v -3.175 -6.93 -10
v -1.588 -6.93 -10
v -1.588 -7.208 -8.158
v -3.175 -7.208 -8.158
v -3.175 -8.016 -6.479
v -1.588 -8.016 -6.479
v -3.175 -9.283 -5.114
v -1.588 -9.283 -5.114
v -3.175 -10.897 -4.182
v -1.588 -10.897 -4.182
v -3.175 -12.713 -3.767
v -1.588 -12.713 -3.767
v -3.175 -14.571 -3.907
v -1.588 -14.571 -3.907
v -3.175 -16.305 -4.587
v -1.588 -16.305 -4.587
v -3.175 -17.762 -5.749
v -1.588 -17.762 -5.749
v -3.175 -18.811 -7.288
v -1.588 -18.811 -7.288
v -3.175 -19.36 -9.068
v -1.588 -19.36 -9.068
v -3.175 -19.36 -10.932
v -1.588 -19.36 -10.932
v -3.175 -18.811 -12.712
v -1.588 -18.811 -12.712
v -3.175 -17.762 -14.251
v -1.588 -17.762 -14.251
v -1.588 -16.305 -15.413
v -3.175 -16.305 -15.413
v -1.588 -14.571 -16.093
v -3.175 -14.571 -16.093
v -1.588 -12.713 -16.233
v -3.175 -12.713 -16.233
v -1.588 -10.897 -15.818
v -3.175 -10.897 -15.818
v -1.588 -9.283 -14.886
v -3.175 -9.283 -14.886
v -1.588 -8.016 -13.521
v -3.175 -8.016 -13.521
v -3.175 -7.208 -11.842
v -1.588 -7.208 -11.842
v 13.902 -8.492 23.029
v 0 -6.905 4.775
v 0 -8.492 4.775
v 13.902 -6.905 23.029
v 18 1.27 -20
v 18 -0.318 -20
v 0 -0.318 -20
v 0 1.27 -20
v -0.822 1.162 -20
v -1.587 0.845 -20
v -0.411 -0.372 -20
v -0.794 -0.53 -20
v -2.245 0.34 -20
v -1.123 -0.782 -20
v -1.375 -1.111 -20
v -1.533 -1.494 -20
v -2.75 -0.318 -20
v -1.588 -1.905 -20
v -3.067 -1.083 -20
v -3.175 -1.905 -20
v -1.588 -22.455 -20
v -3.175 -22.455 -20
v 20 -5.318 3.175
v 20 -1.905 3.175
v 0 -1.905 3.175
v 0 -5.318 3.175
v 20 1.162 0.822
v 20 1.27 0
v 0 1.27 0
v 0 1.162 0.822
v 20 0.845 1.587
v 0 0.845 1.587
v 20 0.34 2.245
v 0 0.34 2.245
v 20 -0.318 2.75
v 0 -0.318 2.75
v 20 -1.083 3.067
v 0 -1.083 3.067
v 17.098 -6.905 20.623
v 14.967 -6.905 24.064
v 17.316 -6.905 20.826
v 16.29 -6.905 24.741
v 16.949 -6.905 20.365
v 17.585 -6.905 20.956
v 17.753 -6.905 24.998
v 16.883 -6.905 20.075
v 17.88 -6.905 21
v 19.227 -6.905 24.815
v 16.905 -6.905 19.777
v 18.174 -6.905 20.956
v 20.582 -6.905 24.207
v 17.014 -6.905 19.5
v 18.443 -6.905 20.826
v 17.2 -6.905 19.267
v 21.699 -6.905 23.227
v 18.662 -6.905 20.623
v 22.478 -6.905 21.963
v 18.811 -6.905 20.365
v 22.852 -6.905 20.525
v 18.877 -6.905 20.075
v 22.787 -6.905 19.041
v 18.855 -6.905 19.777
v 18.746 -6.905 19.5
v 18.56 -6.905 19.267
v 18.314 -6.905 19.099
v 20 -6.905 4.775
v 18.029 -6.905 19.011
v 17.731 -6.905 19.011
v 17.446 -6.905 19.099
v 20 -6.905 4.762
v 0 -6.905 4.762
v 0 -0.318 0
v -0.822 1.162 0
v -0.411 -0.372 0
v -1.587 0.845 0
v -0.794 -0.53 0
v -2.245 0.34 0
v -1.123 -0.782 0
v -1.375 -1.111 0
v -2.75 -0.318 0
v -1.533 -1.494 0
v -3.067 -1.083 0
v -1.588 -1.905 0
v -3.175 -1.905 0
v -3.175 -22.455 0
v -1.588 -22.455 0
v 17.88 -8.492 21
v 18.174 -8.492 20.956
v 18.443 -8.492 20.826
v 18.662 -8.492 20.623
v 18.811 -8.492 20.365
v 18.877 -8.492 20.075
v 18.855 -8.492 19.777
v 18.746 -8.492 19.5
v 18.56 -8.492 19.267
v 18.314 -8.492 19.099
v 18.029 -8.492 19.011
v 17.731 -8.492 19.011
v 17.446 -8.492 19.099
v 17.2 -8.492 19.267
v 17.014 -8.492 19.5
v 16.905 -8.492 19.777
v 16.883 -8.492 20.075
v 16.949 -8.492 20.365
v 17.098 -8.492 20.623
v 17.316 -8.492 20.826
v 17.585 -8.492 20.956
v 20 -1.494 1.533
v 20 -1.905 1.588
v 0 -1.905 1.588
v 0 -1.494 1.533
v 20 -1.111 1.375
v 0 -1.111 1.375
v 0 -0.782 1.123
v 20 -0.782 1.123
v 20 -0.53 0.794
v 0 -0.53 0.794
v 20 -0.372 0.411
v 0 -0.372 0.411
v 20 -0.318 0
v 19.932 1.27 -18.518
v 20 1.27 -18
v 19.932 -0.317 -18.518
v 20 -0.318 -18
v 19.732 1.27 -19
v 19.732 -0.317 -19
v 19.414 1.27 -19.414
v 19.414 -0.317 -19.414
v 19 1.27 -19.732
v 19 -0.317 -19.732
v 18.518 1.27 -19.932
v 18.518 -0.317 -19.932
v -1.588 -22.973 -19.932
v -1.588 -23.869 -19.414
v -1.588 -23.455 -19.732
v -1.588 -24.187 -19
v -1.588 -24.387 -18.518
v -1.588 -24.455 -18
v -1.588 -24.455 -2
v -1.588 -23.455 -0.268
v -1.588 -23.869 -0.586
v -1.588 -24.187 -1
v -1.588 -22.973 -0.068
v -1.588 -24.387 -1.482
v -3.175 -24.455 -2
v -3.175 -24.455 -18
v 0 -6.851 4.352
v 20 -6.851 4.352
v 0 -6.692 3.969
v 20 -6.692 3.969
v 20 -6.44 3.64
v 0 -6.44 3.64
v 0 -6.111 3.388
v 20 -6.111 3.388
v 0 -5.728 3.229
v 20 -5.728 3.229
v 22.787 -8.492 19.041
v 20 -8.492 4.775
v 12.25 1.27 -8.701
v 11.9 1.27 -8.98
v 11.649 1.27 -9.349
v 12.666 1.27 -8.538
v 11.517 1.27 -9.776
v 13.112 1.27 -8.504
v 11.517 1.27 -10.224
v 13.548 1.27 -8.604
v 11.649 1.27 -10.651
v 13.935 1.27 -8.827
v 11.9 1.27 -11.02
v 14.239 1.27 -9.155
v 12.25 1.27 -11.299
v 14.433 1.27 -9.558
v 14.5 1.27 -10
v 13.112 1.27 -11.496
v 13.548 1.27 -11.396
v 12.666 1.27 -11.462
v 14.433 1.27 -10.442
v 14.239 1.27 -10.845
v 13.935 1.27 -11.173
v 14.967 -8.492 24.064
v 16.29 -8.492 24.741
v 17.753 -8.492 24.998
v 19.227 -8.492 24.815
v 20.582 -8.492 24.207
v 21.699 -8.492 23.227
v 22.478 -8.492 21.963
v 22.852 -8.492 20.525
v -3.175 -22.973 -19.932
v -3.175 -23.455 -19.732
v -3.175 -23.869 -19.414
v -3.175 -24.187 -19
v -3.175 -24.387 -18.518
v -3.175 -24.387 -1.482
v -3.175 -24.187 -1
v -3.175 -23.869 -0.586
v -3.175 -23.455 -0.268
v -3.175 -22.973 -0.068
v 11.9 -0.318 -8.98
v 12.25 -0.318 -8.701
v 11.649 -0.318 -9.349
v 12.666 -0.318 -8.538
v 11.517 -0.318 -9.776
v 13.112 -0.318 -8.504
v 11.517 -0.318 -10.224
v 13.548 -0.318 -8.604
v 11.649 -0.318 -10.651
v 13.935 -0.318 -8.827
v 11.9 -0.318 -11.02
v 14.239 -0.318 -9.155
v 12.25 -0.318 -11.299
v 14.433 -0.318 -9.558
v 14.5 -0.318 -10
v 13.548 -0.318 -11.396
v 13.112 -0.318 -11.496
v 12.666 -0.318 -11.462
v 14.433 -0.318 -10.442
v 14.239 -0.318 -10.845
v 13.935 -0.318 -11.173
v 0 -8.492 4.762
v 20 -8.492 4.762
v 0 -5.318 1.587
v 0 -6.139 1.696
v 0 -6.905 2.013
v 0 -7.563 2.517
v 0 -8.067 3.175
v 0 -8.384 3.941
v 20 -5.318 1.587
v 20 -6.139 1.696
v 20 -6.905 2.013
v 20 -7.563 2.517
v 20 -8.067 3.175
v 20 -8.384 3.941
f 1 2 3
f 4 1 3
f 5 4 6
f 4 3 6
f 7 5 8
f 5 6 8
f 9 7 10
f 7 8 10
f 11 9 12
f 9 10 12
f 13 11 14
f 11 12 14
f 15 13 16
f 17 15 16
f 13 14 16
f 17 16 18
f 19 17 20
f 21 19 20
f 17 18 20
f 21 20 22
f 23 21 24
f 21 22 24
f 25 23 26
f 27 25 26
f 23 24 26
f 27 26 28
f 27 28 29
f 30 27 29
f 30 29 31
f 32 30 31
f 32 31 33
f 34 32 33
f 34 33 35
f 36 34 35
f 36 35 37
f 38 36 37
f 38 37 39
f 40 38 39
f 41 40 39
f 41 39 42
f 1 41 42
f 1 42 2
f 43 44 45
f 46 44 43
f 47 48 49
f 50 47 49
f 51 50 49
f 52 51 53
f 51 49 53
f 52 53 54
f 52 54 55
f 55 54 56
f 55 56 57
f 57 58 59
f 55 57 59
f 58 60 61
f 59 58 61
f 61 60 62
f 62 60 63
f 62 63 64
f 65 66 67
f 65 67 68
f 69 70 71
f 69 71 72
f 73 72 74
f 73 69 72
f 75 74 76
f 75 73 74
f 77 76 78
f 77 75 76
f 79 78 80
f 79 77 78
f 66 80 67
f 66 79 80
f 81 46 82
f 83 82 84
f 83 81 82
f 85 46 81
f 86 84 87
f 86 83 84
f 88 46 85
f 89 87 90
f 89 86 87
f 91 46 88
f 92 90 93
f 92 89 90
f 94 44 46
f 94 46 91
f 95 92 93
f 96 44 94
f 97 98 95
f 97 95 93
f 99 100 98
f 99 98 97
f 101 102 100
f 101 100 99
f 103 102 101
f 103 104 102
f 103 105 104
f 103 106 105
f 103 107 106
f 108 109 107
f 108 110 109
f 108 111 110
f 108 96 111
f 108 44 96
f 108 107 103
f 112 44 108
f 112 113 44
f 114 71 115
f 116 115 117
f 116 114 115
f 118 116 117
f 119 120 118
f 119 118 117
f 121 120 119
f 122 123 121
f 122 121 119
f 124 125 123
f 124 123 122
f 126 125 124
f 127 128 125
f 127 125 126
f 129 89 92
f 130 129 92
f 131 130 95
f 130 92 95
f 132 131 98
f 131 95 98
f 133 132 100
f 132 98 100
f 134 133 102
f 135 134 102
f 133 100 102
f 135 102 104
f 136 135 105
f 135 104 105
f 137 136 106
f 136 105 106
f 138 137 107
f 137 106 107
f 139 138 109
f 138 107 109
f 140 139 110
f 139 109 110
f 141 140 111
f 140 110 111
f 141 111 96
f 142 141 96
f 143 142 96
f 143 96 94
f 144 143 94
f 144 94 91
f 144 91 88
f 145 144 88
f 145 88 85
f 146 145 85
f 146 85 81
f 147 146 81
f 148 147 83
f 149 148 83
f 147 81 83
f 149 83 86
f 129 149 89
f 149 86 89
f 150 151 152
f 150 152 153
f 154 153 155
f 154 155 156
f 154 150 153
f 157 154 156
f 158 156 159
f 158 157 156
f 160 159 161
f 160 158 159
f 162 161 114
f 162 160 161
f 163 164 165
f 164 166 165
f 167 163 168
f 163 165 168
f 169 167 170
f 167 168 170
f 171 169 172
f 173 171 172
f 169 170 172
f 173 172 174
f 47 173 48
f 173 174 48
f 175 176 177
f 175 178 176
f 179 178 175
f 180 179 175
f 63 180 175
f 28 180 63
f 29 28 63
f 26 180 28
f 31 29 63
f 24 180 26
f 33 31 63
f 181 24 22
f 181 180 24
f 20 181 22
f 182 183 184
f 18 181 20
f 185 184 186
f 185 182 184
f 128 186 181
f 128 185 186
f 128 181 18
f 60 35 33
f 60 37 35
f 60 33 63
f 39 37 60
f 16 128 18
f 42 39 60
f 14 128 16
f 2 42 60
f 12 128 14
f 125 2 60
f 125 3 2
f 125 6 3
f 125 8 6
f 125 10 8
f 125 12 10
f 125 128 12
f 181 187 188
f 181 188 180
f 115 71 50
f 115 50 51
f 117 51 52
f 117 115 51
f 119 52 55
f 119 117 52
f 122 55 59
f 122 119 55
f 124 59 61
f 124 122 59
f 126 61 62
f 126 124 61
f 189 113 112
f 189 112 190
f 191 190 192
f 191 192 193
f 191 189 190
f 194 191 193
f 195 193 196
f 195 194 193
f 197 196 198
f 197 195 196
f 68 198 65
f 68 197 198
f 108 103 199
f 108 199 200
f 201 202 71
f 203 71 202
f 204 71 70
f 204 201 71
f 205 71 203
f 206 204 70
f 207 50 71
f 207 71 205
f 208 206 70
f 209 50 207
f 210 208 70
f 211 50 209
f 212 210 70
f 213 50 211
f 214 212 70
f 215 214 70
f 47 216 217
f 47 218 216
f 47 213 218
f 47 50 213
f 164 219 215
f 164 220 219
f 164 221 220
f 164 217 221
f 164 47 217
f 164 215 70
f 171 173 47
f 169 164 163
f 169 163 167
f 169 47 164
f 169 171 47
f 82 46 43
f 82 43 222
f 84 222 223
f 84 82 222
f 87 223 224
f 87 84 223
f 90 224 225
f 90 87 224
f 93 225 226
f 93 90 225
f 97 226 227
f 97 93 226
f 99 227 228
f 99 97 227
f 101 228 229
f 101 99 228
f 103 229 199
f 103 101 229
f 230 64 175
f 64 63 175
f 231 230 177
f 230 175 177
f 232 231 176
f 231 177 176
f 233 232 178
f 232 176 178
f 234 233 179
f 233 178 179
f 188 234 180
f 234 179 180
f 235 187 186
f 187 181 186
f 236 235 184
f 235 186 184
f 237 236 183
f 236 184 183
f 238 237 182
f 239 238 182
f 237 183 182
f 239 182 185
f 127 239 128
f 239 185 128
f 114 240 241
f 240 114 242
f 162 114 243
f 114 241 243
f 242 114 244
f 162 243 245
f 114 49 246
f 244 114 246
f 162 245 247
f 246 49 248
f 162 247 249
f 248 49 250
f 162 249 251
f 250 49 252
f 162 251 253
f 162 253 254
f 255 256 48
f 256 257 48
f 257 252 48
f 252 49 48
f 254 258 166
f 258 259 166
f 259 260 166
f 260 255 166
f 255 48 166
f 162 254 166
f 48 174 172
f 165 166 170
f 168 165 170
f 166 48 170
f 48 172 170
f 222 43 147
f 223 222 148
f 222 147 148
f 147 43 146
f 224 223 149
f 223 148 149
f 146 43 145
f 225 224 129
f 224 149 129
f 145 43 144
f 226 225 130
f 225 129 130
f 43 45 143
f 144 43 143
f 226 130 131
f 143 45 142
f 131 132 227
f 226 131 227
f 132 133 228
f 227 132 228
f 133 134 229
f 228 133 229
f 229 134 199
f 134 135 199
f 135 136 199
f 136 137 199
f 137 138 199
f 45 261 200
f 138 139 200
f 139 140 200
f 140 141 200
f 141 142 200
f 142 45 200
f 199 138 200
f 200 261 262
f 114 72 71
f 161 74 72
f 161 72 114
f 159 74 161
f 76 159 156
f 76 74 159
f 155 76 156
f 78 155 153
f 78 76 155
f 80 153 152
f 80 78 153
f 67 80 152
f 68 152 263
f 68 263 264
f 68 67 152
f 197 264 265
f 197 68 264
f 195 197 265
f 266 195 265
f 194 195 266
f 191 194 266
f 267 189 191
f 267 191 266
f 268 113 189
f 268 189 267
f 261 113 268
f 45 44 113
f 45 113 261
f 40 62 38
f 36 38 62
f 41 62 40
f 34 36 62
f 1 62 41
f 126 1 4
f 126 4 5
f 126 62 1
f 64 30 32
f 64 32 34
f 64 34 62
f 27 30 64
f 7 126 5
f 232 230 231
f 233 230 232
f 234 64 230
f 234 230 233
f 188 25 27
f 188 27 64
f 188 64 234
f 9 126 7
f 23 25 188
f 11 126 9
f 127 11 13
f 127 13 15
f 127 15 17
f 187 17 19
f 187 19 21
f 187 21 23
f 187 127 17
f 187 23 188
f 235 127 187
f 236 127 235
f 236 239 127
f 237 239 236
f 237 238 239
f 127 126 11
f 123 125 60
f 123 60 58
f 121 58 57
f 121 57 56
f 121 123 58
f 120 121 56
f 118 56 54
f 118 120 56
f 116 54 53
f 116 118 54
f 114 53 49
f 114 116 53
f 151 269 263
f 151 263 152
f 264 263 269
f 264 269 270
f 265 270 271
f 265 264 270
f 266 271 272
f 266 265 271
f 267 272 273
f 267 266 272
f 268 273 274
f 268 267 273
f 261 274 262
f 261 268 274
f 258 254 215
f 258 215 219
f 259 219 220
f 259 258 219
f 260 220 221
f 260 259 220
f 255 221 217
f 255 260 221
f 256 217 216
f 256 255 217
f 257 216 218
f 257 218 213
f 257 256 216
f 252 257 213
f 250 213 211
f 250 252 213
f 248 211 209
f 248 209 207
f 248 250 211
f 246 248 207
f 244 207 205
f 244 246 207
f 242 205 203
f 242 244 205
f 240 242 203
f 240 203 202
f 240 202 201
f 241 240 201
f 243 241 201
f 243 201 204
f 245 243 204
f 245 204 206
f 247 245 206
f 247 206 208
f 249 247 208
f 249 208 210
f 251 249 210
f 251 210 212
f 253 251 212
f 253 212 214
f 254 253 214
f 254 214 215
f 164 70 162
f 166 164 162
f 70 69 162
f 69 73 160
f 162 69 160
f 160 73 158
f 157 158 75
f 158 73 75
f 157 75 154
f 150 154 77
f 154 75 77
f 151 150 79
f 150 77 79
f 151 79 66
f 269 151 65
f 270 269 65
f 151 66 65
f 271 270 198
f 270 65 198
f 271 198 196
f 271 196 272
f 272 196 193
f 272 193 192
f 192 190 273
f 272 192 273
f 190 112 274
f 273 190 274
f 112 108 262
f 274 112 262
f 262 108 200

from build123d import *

# Parameters (mm, degrees)
SKETCH2_W                = 20
SKETCH2_H                = 20
BOSS_EXTRUDE1_DEPTH      = 1.27
HOLE1_OUTLINE_R          = 1.5
HOLE1_DEPTH              = 1.27
CONVERT_SOLID3_START     = -0.3175
CONVERT_SOLID3_OUTLINE_W = 20
CONVERT_SOLID3_OUTLINE_H = 20
CONVERT_SOLID3_OUTLINE_R = 1.5
CONVERT_SOLID3_DEPTH     = 0.3175
EDGE_FLANGE1_DEPTH       = 20
CUT_EXTRUDE1_REACH       = 40.263
SKETCH25_R               = 6.25
EDGE_FLANGE3_DEPTH       = 20
EDGE_FLANGE4_DEPTH       = 20
SKETCH31_R               = 1
BOSS_EXTRUDE2_DEPTH      = 1.5875
FILLET1_R                = 2


# Read off the part's stored shape, not the designer's step: Hole1, Convert-Solid3
# Sheet-metal steps are written as plain solids
with BuildPart() as part:
    # Sketch2 → Boss-Extrude1 (new body)
    with BuildSketch(Plane(origin=(0, 0, 0), x_dir=(1, 0, 0), z_dir=(0, 1, 0))):
        with Locations((10, 10)):
            Rectangle(SKETCH2_W, SKETCH2_H)
    extrude(amount=BOSS_EXTRUDE1_DEPTH)

    # Hole1 outline → Hole1 (cut)
    with BuildSketch(Plane(origin=(0, 0, 0), x_dir=(1, 0, 0), z_dir=(0, 1, 0))):
        with Locations((13, 10)):
            Circle(HOLE1_OUTLINE_R)
    extrude(amount=HOLE1_DEPTH, mode=Mode.SUBTRACT)

    # Convert-Solid3 outline → Convert-Solid3 (add)
    with BuildSketch(Plane(origin=(0, 0, 0), x_dir=(1, 0, 0), z_dir=(0, 1, 0)).offset(CONVERT_SOLID3_START)):
        with Locations((10, 10)):
            Rectangle(CONVERT_SOLID3_OUTLINE_W, CONVERT_SOLID3_OUTLINE_H)
        with Locations((13, 10)):
            Circle(CONVERT_SOLID3_OUTLINE_R, mode=Mode.SUBTRACT)
    extrude(amount=CONVERT_SOLID3_DEPTH)

    # Edge-Flange1 section (across the edge) → Edge-Flange1 (add)
    with BuildSketch(Plane(origin=(-1.5875, -0.3175, 0), x_dir=(1, 0, 0), z_dir=(0, 0, -1))):
        with BuildLine():
            Line((-1.5875, 1.5875), (-1.5875, 24.1375))
            Line((-1.5875, 24.1375), (0, 24.1375))
            Line((0, 24.1375), (0, 1.5875))
            ThreePointArc((0, 1.5875), (0.464967985, 0.464967985), (1.5875, 0))
            Line((1.5875, 0), (1.5875, -1.5875))
            ThreePointArc((1.5875, -1.5875), (-0.65756403, -0.65756403), (-1.5875, 1.5875))
        make_face()
    extrude(amount=EDGE_FLANGE1_DEPTH)

    # Sketch25 → Cut-Extrude1 (cut, up to next)
    with BuildSketch(Plane(origin=(-1.5875, 0, 0), x_dir=(0, 0, -1), z_dir=(1, 0, 0)), mode=Mode.PRIVATE) as cut_extrude1_sk1:
        with Locations(Location((10, -13.18, 0), (0, 0, 90))):
            Circle(SKETCH25_R)
    cut_extrude1_tool1 = extrude(cut_extrude1_sk1.sketch, amount=-CUT_EXTRUDE1_REACH, mode=Mode.PRIVATE) & part.part
    add(cut_extrude1_tool1.solids().sort_by_distance((-1.5875, -13.18, -10))[0], mode=Mode.SUBTRACT)

    # Edge-Flange3 section (across the edge) → Edge-Flange3 (add)
    with BuildSketch(Plane(origin=(20, -0.3175, 1.5875), x_dir=(0, 0, -1), z_dir=(-1, 0, 0))):
        with BuildLine():
            Line((-1.5875, 1.5875), (-1.5875, 5))
            Line((-1.5875, 5), (0, 5))
            Line((0, 5), (0, 1.5875))
            ThreePointArc((0, 1.5875), (0.464967985, 0.464967985), (1.5875, 0))
            Line((1.5875, 0), (1.5875, -1.5875))
            ThreePointArc((1.5875, -1.5875), (-0.65756403, -0.65756403), (-1.5875, 1.5875))
        make_face()
    extrude(amount=EDGE_FLANGE3_DEPTH)

    # Edge-Flange4 section (across the edge) → Edge-Flange4 (add)
    with BuildSketch(Plane(origin=(0, -6.905, 3.175), x_dir=(0, 1, 0), z_dir=(1, 0, 0))):
        with BuildLine():
            Line((-1.5875, 1.5875), (-1.5875, 1.6))
            Line((-1.5875, 1.6), (0, 1.6))
            Line((0, 1.6), (0, 1.5875))
            ThreePointArc((0, 1.5875), (0.464967985, 0.464967985), (1.5875, 0))
            Line((1.5875, 0), (1.5875, -1.5875))
            ThreePointArc((1.5875, -1.5875), (-0.65756403, -0.65756403), (-1.5875, 1.5875))
        make_face()
    extrude(amount=EDGE_FLANGE4_DEPTH)

    # Sketch31 → Boss-Extrude2 (add)
    with BuildSketch(Plane(origin=(0, -6.905, 0), x_dir=(1, 0, 0), z_dir=(0, 1, 0))):
        with BuildLine():
            Line((20, -4.775), (0, -4.775))
            Line((0, -4.775), (13.901931499, -23.029367025))
            ThreePointArc((13.901931499, -23.029367025), (19.927179344, -24.561576399), (22.7869765, -19.041355625))
            Line((22.7869765, -19.041355625), (20, -4.775))
        make_face()
        with Locations(Location((17.879736852, -20, 0), (0, 0, 270))):
            Circle(SKETCH31_R, mode=Mode.SUBTRACT)
    extrude(amount=-BOSS_EXTRUDE2_DEPTH)

    # Fillet1
    fillet1_edges = [part.edges().sort_by_distance(p)[0] for p in [
        (20, 0.47625, -20),
        (-2.38125, -24.455, 0),
        (-2.38125, -24.455, -20),
    ]]
    fillet(fillet1_edges, radius=FILLET1_R)


solid = part.part
